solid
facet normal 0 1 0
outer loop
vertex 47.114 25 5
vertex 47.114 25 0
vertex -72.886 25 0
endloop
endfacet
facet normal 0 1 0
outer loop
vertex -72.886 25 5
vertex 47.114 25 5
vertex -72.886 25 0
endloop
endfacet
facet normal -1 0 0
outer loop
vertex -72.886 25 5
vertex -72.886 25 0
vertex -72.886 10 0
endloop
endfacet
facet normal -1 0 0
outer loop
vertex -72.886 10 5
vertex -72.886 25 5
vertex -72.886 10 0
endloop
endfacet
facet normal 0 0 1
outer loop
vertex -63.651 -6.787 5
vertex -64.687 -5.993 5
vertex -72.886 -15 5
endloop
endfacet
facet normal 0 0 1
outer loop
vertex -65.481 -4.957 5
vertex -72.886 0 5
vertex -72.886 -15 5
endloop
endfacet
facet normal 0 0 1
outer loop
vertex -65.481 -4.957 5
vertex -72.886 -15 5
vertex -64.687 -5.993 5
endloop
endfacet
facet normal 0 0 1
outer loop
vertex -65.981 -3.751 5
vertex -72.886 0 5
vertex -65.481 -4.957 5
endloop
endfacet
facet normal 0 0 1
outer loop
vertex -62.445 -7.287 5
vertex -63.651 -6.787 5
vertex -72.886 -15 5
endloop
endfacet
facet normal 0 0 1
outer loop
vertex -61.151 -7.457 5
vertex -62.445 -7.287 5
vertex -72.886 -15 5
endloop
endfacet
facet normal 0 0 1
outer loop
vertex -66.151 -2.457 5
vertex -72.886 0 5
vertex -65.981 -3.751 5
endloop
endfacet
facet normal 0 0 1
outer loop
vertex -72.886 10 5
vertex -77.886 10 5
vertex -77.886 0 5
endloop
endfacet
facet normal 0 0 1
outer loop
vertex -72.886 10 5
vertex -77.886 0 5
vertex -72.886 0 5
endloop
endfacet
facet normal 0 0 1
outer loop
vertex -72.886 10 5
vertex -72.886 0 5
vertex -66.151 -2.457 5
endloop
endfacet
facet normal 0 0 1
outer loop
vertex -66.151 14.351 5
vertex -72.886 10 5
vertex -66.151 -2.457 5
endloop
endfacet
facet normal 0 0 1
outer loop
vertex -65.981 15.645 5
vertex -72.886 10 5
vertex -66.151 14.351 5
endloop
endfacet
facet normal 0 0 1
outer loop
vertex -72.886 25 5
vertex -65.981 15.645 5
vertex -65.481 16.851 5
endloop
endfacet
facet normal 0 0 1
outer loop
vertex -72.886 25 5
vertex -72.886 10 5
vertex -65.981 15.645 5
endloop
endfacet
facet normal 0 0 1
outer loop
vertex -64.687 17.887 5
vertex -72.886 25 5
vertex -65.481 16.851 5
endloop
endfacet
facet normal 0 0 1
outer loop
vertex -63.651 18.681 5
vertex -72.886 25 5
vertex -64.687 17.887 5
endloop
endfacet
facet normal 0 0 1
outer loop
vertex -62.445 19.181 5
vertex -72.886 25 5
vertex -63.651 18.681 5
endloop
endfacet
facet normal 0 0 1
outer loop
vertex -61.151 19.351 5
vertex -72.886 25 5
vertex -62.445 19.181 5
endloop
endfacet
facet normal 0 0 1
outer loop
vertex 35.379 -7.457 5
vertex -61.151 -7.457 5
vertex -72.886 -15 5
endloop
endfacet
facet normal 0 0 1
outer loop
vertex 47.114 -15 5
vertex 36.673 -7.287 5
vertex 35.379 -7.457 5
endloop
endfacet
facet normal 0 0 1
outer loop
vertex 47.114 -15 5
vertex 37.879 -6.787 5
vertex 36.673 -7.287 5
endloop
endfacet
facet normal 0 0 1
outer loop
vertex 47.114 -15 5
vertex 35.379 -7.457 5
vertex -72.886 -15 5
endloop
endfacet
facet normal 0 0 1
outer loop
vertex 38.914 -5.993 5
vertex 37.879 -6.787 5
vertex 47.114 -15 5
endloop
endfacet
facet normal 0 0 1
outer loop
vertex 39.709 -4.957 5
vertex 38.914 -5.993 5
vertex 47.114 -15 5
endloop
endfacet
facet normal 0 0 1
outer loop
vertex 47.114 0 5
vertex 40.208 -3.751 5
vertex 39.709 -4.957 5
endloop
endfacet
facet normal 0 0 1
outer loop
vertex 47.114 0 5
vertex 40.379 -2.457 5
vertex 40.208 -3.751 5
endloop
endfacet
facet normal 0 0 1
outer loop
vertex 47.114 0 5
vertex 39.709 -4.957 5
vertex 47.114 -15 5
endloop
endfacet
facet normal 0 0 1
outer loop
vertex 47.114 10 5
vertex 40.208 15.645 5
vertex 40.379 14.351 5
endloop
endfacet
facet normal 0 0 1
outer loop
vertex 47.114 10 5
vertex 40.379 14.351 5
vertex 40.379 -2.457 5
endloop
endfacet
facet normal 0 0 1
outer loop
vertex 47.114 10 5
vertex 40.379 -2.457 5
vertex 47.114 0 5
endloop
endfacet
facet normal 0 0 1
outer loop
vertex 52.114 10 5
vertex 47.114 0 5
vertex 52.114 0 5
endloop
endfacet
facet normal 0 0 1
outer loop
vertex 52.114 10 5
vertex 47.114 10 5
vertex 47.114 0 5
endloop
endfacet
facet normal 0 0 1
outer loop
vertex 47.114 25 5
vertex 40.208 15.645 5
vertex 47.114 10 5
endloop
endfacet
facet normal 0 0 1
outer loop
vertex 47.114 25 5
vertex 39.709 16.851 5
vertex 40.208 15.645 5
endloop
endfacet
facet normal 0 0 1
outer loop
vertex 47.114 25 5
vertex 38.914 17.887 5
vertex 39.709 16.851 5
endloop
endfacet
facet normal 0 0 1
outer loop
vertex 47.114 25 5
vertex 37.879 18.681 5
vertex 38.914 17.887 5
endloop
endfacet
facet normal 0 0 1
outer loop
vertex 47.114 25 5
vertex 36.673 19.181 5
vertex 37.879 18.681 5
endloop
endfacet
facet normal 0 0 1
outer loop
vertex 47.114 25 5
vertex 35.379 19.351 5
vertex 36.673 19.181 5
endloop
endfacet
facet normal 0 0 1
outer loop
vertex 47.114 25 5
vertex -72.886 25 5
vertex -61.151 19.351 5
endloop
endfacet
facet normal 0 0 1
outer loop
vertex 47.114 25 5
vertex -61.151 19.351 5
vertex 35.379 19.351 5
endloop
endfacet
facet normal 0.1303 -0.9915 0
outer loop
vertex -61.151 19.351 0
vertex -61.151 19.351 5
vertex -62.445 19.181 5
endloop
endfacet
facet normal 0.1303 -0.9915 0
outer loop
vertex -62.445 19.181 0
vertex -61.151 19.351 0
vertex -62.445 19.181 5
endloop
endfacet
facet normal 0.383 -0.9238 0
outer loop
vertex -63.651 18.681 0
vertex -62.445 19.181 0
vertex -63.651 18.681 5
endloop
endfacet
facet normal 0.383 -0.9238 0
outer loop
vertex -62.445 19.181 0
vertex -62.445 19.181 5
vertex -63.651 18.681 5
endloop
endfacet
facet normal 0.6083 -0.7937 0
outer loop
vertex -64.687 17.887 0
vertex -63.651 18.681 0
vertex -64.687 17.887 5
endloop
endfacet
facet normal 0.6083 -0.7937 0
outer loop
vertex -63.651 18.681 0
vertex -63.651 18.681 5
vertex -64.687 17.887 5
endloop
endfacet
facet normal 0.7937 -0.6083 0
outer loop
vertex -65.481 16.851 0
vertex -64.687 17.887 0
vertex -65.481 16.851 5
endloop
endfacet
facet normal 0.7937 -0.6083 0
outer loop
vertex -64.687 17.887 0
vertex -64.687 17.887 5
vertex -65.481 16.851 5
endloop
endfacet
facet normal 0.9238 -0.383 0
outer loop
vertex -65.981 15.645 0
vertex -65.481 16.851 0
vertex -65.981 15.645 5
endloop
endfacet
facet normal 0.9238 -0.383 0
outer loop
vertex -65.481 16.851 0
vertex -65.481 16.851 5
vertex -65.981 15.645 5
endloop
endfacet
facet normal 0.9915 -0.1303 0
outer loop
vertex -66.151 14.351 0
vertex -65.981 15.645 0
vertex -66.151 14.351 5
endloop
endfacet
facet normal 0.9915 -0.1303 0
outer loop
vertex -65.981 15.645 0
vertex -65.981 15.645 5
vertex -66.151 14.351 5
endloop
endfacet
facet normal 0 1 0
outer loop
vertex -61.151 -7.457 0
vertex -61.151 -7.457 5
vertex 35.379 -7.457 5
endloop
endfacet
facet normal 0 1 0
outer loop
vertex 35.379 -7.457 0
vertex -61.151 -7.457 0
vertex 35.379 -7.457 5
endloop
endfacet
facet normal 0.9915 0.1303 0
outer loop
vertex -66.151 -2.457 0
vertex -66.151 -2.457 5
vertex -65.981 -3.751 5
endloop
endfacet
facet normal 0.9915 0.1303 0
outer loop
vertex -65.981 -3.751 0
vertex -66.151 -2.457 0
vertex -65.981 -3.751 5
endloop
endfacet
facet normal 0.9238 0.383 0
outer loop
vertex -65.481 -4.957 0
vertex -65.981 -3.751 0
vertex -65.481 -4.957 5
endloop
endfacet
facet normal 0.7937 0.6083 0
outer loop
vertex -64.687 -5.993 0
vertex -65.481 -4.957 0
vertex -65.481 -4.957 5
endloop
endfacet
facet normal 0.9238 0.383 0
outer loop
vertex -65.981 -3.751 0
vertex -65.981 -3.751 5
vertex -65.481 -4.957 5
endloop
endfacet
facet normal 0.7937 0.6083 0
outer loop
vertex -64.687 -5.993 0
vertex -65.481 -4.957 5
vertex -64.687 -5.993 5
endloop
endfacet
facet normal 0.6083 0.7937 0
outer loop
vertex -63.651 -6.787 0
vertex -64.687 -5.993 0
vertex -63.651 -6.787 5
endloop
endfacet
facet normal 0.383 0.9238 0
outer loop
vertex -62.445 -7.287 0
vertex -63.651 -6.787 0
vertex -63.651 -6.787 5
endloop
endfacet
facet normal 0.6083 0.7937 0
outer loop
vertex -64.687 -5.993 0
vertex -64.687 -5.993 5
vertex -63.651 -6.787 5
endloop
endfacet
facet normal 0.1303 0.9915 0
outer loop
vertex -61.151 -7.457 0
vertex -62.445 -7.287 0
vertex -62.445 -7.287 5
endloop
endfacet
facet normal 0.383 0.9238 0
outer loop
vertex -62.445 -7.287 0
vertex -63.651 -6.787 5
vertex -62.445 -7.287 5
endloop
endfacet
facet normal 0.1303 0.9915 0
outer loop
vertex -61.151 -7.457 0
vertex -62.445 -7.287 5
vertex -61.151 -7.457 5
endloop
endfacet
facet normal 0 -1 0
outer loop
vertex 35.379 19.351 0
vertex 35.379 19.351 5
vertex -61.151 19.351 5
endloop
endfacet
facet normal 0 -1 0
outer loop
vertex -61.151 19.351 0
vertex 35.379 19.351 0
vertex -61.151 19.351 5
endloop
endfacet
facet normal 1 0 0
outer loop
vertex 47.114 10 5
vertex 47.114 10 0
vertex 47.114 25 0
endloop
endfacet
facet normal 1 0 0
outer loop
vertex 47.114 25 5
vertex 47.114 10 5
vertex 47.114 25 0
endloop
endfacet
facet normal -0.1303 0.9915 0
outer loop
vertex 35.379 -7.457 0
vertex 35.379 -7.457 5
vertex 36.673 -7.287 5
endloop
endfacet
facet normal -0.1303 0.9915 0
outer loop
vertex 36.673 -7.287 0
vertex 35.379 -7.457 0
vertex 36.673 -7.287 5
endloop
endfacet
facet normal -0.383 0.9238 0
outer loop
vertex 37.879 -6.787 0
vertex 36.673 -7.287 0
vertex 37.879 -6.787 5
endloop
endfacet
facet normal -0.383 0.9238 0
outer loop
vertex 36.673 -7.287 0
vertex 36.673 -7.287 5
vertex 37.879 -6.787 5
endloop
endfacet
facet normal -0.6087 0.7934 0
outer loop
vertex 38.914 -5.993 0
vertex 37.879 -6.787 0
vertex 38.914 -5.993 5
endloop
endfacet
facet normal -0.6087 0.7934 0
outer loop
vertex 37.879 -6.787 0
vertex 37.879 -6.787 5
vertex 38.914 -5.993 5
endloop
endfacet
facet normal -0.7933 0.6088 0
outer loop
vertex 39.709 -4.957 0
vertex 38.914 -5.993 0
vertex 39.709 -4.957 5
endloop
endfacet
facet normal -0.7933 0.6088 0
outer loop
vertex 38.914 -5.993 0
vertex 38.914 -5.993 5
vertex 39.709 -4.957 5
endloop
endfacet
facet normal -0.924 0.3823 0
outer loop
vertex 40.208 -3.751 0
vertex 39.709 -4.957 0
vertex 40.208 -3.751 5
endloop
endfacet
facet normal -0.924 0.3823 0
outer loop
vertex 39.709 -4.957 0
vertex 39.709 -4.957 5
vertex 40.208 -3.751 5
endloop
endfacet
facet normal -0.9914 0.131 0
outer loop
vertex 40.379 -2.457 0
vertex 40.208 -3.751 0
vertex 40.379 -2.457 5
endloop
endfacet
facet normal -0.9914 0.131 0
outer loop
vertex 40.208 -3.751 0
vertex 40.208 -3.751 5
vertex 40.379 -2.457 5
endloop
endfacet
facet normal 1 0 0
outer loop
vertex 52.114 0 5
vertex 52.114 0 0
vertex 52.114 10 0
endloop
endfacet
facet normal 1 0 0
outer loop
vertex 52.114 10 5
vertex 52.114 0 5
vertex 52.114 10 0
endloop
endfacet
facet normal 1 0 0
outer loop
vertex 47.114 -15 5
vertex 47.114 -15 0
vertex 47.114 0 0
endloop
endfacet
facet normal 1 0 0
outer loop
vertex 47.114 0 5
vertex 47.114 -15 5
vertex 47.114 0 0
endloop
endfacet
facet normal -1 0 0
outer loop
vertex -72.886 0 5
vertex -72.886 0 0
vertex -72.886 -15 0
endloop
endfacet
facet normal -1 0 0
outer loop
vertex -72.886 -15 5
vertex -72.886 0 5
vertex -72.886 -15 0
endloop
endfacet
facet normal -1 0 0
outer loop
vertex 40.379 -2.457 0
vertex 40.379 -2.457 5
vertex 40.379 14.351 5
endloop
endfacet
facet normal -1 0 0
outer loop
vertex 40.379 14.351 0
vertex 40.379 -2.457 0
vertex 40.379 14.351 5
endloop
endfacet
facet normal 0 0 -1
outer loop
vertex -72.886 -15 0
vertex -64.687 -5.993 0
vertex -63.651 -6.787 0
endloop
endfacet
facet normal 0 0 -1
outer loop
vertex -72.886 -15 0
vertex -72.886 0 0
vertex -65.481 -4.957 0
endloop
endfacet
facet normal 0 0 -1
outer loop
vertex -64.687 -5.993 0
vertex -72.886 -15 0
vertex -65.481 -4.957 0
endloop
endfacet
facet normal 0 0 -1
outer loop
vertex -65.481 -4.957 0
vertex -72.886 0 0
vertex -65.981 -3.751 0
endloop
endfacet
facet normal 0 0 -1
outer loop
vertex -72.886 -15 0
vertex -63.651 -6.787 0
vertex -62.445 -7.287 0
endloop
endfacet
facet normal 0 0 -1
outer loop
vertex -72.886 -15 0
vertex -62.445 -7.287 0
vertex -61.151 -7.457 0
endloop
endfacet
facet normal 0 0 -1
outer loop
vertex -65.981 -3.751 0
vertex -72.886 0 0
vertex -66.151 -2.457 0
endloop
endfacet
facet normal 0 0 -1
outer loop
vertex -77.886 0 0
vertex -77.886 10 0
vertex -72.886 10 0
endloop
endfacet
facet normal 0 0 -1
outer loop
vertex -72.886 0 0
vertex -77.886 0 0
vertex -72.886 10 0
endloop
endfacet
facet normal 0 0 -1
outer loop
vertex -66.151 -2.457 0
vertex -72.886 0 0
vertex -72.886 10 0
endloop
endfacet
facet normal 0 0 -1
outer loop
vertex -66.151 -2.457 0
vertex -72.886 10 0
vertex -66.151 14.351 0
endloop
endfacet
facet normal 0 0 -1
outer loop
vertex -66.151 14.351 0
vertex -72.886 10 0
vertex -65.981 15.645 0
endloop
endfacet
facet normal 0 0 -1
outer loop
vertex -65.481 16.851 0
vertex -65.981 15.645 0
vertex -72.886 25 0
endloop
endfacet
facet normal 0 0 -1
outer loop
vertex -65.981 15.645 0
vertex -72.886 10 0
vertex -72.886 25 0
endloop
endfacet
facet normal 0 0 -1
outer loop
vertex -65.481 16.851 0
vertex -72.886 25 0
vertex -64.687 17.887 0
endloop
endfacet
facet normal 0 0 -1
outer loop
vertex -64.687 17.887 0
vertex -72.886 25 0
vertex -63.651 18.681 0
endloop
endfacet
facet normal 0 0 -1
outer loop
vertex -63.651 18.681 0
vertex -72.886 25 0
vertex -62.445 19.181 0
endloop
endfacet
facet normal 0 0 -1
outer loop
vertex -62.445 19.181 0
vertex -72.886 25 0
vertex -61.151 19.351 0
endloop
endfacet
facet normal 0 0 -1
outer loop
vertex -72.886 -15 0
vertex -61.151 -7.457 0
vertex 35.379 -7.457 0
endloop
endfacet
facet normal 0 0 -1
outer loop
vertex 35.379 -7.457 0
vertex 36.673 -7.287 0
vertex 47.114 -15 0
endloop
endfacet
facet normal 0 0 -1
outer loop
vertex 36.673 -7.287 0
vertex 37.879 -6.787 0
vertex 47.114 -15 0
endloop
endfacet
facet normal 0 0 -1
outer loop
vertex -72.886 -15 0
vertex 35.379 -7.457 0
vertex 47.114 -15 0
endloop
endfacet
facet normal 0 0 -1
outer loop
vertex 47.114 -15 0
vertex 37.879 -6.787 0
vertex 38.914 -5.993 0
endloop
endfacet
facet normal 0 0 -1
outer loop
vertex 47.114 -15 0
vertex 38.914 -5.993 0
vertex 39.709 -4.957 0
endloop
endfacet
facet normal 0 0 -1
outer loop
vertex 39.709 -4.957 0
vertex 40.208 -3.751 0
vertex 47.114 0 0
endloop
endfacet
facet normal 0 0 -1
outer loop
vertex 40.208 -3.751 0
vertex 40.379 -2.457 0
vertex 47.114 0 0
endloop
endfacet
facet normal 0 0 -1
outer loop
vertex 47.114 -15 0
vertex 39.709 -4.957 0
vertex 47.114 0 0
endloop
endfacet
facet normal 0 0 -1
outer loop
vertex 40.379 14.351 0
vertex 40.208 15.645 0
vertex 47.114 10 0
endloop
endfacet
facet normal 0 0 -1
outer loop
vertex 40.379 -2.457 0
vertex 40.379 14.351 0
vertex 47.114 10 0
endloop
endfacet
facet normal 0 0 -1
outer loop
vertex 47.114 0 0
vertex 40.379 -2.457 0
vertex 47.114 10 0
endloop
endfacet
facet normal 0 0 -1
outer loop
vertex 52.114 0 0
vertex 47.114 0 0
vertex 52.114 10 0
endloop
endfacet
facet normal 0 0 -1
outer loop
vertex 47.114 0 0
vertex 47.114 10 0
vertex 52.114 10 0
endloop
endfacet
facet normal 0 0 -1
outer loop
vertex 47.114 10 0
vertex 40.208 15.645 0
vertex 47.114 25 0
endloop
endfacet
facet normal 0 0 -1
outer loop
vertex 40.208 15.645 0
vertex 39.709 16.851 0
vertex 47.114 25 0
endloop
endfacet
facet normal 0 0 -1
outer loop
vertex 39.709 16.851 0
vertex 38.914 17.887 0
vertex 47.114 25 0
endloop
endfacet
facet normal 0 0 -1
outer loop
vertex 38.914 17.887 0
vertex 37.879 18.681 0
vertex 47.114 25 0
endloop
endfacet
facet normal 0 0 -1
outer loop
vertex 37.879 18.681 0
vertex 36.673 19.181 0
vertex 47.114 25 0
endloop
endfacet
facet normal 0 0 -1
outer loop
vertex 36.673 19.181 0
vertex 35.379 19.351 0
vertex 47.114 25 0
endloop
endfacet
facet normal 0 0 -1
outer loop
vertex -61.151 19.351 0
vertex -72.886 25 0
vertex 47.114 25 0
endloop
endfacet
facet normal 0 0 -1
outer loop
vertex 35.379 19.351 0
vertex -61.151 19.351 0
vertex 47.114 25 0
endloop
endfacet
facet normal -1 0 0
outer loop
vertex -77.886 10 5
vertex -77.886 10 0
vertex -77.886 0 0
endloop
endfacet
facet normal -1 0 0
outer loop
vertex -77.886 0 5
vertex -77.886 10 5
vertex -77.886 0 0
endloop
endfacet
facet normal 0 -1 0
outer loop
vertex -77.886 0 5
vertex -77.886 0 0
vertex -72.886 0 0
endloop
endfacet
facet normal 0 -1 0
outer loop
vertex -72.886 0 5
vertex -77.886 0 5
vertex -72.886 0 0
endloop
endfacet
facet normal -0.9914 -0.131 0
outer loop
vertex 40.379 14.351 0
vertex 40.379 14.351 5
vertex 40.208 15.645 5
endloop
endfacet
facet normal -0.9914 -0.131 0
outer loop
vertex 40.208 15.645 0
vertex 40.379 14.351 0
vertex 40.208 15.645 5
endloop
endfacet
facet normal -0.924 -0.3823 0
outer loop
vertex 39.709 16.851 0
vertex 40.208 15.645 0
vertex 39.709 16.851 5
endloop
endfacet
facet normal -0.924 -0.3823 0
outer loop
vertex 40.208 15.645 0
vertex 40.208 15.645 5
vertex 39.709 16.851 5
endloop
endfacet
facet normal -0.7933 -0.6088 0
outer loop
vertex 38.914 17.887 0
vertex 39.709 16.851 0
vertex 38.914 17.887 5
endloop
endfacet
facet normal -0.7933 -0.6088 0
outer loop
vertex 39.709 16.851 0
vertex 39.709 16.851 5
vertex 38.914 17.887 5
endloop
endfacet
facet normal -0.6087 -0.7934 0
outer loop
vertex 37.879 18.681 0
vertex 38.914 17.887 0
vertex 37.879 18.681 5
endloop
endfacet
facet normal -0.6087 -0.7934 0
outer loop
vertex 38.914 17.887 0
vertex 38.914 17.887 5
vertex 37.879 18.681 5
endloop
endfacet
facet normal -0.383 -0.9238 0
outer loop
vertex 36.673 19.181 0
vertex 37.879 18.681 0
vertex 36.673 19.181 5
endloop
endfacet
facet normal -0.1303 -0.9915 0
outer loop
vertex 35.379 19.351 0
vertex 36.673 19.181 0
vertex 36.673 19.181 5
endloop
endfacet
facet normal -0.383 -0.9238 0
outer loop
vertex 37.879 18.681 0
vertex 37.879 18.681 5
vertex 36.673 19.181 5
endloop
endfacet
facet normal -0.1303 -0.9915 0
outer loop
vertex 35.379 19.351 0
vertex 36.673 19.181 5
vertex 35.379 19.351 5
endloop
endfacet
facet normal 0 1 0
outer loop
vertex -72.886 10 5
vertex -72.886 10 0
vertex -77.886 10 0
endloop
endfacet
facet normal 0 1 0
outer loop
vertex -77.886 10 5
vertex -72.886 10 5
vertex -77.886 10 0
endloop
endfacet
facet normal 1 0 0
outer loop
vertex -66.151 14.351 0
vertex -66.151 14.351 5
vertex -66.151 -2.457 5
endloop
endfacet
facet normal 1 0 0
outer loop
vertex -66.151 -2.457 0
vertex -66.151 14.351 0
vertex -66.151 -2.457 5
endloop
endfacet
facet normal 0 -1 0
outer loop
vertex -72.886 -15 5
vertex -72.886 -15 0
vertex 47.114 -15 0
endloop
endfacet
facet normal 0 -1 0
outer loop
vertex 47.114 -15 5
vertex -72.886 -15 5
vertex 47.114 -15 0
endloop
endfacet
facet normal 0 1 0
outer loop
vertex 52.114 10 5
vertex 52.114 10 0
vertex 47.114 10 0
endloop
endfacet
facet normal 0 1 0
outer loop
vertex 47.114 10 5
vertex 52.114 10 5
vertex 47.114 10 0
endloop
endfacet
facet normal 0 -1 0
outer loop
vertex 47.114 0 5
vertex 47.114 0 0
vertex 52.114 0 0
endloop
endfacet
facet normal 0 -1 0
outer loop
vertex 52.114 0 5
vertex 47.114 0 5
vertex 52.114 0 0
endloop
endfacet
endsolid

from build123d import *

# Parameters (mm, degrees)
F1_DEPTH = 5
F3_DEPTH = 25


with BuildPart() as f1:
    # F0 (on Top) → F1 (new body)
    with BuildSketch(Plane.XY):
        Polygon((47.113799, 25), (-72.886201, 25), (-72.886201, 10), (-77.886201, 10), (-77.886201, 0), (-72.886201, 0), (-72.886201, -15), (47.113799, -15), (47.113799, 0), (52.113799, 0), (52.113799, 10), (47.113799, 10), align=None)
        with BuildLine():
            ThreePointArc((-62.401845, 10.947084), (-60.937379, 14.482618), (-57.401845, 15.947084))
            Line((-57.401845, 15.947084), (-27.401845, 15.947084))
            ThreePointArc((-27.401845, 15.947084), (-25.855638, 15.702002), (-24.46101, 14.990782))
            ThreePointArc((-24.46101, 14.990782), (-22.946277, 13.215985), (-22.401845, 10.947084))
            Line((-22.401845, 10.947084), (-22.401845, 0.947084))
            ThreePointArc((-22.401845, 0.947084), (-23.866311, -2.58845), (-27.401845, -4.052916))
            Line((-27.401845, -4.052916), (-57.401845, -4.052916))
            ThreePointArc((-57.401845, -4.052916), (-60.937379, -2.58845), (-62.401845, 0.947084))
            Line((-62.401845, 0.947084), (-62.401845, 10.947084))
        make_face(mode=Mode.SUBTRACT)
        with BuildLine():
            ThreePointArc((2.598155, -4.052916), (-0.937379, -2.58845), (-2.401845, 0.947084))
            Line((-2.401845, 0.947084), (-2.401845, 10.947084))
            ThreePointArc((-2.401845, 10.947084), (-0.937379, 14.482618), (2.598155, 15.947084))
            Line((2.598155, 15.947084), (32.598155, 15.947084))
            ThreePointArc((32.598155, 15.947084), (36.133689, 14.482618), (37.598155, 10.947084))
            Line((37.598155, 10.947084), (37.598155, 0.947084))
            ThreePointArc((37.598155, 0.947084), (36.133689, -2.58845), (32.598155, -4.052916))
            Line((32.598155, -4.052916), (2.598155, -4.052916))
        make_face(mode=Mode.SUBTRACT)
    extrude(amount=F1_DEPTH)

    # F2 (on face) → F3 (cut)
    with BuildSketch(Plane.XY.offset(5)):
        with BuildLine():
            ThreePointArc((40.378798, 14.351363), (38.914332, 17.886897), (35.378798, 19.351363))
            Line((35.378798, 19.351363), (-61.151201, 19.351363))
            ThreePointArc((-61.151201, 19.351363), (-64.686735, 17.886897), (-66.151201, 14.351363))
            Line((-66.151201, 14.351363), (-66.151201, -2.457194))
            ThreePointArc((-66.151201, -2.457194), (-64.686735, -5.992728), (-61.151201, -7.457194))
            Line((-61.151201, -7.457194), (35.378798, -7.457194))
            ThreePointArc((35.378798, -7.457194), (38.914332, -5.992728), (40.378798, -2.457194))
            Line((40.378798, -2.457194), (40.378798, 14.351363))
        make_face()
        with BuildLine():
            ThreePointArc((-57.401845, -4.052916), (-60.937379, -2.58845), (-62.401845, 0.947084))
            Line((-62.401845, 0.947084), (-62.401845, 10.947084))
            ThreePointArc((-62.401845, 10.947084), (-60.937379, 14.482618), (-57.401845, 15.947084))
            Line((-57.401845, 15.947084), (-27.401845, 15.947084))
            ThreePointArc((-27.401845, 15.947084), (-23.866311, 14.482618), (-22.401845, 10.947084))
            Line((-22.401845, 10.947084), (-22.401845, 0.947084))
            ThreePointArc((-22.401845, 0.947084), (-23.866311, -2.58845), (-27.401845, -4.052916))
            Line((-27.401845, -4.052916), (-57.401845, -4.052916))
        make_face(mode=Mode.SUBTRACT)
        with BuildLine():
            ThreePointArc((37.598155, 0.947084), (36.133689, -2.58845), (32.598155, -4.052916))
            Line((32.598155, -4.052916), (2.598155, -4.052916))
            ThreePointArc((2.598155, -4.052916), (-0.937379, -2.58845), (-2.401845, 0.947084))
            Line((-2.401845, 0.947084), (-2.401845, 10.947084))
            ThreePointArc((-2.401845, 10.947084), (-0.937379, 14.482618), (2.598155, 15.947084))
            Line((2.598155, 15.947084), (32.598155, 15.947084))
            ThreePointArc((32.598155, 15.947084), (36.133689, 14.482618), (37.598155, 10.947084))
            Line((37.598155, 10.947084), (37.598155, 0.947084))
        make_face(mode=Mode.SUBTRACT)
    extrude(amount=-F3_DEPTH, mode=Mode.SUBTRACT)


solid = f1.part
